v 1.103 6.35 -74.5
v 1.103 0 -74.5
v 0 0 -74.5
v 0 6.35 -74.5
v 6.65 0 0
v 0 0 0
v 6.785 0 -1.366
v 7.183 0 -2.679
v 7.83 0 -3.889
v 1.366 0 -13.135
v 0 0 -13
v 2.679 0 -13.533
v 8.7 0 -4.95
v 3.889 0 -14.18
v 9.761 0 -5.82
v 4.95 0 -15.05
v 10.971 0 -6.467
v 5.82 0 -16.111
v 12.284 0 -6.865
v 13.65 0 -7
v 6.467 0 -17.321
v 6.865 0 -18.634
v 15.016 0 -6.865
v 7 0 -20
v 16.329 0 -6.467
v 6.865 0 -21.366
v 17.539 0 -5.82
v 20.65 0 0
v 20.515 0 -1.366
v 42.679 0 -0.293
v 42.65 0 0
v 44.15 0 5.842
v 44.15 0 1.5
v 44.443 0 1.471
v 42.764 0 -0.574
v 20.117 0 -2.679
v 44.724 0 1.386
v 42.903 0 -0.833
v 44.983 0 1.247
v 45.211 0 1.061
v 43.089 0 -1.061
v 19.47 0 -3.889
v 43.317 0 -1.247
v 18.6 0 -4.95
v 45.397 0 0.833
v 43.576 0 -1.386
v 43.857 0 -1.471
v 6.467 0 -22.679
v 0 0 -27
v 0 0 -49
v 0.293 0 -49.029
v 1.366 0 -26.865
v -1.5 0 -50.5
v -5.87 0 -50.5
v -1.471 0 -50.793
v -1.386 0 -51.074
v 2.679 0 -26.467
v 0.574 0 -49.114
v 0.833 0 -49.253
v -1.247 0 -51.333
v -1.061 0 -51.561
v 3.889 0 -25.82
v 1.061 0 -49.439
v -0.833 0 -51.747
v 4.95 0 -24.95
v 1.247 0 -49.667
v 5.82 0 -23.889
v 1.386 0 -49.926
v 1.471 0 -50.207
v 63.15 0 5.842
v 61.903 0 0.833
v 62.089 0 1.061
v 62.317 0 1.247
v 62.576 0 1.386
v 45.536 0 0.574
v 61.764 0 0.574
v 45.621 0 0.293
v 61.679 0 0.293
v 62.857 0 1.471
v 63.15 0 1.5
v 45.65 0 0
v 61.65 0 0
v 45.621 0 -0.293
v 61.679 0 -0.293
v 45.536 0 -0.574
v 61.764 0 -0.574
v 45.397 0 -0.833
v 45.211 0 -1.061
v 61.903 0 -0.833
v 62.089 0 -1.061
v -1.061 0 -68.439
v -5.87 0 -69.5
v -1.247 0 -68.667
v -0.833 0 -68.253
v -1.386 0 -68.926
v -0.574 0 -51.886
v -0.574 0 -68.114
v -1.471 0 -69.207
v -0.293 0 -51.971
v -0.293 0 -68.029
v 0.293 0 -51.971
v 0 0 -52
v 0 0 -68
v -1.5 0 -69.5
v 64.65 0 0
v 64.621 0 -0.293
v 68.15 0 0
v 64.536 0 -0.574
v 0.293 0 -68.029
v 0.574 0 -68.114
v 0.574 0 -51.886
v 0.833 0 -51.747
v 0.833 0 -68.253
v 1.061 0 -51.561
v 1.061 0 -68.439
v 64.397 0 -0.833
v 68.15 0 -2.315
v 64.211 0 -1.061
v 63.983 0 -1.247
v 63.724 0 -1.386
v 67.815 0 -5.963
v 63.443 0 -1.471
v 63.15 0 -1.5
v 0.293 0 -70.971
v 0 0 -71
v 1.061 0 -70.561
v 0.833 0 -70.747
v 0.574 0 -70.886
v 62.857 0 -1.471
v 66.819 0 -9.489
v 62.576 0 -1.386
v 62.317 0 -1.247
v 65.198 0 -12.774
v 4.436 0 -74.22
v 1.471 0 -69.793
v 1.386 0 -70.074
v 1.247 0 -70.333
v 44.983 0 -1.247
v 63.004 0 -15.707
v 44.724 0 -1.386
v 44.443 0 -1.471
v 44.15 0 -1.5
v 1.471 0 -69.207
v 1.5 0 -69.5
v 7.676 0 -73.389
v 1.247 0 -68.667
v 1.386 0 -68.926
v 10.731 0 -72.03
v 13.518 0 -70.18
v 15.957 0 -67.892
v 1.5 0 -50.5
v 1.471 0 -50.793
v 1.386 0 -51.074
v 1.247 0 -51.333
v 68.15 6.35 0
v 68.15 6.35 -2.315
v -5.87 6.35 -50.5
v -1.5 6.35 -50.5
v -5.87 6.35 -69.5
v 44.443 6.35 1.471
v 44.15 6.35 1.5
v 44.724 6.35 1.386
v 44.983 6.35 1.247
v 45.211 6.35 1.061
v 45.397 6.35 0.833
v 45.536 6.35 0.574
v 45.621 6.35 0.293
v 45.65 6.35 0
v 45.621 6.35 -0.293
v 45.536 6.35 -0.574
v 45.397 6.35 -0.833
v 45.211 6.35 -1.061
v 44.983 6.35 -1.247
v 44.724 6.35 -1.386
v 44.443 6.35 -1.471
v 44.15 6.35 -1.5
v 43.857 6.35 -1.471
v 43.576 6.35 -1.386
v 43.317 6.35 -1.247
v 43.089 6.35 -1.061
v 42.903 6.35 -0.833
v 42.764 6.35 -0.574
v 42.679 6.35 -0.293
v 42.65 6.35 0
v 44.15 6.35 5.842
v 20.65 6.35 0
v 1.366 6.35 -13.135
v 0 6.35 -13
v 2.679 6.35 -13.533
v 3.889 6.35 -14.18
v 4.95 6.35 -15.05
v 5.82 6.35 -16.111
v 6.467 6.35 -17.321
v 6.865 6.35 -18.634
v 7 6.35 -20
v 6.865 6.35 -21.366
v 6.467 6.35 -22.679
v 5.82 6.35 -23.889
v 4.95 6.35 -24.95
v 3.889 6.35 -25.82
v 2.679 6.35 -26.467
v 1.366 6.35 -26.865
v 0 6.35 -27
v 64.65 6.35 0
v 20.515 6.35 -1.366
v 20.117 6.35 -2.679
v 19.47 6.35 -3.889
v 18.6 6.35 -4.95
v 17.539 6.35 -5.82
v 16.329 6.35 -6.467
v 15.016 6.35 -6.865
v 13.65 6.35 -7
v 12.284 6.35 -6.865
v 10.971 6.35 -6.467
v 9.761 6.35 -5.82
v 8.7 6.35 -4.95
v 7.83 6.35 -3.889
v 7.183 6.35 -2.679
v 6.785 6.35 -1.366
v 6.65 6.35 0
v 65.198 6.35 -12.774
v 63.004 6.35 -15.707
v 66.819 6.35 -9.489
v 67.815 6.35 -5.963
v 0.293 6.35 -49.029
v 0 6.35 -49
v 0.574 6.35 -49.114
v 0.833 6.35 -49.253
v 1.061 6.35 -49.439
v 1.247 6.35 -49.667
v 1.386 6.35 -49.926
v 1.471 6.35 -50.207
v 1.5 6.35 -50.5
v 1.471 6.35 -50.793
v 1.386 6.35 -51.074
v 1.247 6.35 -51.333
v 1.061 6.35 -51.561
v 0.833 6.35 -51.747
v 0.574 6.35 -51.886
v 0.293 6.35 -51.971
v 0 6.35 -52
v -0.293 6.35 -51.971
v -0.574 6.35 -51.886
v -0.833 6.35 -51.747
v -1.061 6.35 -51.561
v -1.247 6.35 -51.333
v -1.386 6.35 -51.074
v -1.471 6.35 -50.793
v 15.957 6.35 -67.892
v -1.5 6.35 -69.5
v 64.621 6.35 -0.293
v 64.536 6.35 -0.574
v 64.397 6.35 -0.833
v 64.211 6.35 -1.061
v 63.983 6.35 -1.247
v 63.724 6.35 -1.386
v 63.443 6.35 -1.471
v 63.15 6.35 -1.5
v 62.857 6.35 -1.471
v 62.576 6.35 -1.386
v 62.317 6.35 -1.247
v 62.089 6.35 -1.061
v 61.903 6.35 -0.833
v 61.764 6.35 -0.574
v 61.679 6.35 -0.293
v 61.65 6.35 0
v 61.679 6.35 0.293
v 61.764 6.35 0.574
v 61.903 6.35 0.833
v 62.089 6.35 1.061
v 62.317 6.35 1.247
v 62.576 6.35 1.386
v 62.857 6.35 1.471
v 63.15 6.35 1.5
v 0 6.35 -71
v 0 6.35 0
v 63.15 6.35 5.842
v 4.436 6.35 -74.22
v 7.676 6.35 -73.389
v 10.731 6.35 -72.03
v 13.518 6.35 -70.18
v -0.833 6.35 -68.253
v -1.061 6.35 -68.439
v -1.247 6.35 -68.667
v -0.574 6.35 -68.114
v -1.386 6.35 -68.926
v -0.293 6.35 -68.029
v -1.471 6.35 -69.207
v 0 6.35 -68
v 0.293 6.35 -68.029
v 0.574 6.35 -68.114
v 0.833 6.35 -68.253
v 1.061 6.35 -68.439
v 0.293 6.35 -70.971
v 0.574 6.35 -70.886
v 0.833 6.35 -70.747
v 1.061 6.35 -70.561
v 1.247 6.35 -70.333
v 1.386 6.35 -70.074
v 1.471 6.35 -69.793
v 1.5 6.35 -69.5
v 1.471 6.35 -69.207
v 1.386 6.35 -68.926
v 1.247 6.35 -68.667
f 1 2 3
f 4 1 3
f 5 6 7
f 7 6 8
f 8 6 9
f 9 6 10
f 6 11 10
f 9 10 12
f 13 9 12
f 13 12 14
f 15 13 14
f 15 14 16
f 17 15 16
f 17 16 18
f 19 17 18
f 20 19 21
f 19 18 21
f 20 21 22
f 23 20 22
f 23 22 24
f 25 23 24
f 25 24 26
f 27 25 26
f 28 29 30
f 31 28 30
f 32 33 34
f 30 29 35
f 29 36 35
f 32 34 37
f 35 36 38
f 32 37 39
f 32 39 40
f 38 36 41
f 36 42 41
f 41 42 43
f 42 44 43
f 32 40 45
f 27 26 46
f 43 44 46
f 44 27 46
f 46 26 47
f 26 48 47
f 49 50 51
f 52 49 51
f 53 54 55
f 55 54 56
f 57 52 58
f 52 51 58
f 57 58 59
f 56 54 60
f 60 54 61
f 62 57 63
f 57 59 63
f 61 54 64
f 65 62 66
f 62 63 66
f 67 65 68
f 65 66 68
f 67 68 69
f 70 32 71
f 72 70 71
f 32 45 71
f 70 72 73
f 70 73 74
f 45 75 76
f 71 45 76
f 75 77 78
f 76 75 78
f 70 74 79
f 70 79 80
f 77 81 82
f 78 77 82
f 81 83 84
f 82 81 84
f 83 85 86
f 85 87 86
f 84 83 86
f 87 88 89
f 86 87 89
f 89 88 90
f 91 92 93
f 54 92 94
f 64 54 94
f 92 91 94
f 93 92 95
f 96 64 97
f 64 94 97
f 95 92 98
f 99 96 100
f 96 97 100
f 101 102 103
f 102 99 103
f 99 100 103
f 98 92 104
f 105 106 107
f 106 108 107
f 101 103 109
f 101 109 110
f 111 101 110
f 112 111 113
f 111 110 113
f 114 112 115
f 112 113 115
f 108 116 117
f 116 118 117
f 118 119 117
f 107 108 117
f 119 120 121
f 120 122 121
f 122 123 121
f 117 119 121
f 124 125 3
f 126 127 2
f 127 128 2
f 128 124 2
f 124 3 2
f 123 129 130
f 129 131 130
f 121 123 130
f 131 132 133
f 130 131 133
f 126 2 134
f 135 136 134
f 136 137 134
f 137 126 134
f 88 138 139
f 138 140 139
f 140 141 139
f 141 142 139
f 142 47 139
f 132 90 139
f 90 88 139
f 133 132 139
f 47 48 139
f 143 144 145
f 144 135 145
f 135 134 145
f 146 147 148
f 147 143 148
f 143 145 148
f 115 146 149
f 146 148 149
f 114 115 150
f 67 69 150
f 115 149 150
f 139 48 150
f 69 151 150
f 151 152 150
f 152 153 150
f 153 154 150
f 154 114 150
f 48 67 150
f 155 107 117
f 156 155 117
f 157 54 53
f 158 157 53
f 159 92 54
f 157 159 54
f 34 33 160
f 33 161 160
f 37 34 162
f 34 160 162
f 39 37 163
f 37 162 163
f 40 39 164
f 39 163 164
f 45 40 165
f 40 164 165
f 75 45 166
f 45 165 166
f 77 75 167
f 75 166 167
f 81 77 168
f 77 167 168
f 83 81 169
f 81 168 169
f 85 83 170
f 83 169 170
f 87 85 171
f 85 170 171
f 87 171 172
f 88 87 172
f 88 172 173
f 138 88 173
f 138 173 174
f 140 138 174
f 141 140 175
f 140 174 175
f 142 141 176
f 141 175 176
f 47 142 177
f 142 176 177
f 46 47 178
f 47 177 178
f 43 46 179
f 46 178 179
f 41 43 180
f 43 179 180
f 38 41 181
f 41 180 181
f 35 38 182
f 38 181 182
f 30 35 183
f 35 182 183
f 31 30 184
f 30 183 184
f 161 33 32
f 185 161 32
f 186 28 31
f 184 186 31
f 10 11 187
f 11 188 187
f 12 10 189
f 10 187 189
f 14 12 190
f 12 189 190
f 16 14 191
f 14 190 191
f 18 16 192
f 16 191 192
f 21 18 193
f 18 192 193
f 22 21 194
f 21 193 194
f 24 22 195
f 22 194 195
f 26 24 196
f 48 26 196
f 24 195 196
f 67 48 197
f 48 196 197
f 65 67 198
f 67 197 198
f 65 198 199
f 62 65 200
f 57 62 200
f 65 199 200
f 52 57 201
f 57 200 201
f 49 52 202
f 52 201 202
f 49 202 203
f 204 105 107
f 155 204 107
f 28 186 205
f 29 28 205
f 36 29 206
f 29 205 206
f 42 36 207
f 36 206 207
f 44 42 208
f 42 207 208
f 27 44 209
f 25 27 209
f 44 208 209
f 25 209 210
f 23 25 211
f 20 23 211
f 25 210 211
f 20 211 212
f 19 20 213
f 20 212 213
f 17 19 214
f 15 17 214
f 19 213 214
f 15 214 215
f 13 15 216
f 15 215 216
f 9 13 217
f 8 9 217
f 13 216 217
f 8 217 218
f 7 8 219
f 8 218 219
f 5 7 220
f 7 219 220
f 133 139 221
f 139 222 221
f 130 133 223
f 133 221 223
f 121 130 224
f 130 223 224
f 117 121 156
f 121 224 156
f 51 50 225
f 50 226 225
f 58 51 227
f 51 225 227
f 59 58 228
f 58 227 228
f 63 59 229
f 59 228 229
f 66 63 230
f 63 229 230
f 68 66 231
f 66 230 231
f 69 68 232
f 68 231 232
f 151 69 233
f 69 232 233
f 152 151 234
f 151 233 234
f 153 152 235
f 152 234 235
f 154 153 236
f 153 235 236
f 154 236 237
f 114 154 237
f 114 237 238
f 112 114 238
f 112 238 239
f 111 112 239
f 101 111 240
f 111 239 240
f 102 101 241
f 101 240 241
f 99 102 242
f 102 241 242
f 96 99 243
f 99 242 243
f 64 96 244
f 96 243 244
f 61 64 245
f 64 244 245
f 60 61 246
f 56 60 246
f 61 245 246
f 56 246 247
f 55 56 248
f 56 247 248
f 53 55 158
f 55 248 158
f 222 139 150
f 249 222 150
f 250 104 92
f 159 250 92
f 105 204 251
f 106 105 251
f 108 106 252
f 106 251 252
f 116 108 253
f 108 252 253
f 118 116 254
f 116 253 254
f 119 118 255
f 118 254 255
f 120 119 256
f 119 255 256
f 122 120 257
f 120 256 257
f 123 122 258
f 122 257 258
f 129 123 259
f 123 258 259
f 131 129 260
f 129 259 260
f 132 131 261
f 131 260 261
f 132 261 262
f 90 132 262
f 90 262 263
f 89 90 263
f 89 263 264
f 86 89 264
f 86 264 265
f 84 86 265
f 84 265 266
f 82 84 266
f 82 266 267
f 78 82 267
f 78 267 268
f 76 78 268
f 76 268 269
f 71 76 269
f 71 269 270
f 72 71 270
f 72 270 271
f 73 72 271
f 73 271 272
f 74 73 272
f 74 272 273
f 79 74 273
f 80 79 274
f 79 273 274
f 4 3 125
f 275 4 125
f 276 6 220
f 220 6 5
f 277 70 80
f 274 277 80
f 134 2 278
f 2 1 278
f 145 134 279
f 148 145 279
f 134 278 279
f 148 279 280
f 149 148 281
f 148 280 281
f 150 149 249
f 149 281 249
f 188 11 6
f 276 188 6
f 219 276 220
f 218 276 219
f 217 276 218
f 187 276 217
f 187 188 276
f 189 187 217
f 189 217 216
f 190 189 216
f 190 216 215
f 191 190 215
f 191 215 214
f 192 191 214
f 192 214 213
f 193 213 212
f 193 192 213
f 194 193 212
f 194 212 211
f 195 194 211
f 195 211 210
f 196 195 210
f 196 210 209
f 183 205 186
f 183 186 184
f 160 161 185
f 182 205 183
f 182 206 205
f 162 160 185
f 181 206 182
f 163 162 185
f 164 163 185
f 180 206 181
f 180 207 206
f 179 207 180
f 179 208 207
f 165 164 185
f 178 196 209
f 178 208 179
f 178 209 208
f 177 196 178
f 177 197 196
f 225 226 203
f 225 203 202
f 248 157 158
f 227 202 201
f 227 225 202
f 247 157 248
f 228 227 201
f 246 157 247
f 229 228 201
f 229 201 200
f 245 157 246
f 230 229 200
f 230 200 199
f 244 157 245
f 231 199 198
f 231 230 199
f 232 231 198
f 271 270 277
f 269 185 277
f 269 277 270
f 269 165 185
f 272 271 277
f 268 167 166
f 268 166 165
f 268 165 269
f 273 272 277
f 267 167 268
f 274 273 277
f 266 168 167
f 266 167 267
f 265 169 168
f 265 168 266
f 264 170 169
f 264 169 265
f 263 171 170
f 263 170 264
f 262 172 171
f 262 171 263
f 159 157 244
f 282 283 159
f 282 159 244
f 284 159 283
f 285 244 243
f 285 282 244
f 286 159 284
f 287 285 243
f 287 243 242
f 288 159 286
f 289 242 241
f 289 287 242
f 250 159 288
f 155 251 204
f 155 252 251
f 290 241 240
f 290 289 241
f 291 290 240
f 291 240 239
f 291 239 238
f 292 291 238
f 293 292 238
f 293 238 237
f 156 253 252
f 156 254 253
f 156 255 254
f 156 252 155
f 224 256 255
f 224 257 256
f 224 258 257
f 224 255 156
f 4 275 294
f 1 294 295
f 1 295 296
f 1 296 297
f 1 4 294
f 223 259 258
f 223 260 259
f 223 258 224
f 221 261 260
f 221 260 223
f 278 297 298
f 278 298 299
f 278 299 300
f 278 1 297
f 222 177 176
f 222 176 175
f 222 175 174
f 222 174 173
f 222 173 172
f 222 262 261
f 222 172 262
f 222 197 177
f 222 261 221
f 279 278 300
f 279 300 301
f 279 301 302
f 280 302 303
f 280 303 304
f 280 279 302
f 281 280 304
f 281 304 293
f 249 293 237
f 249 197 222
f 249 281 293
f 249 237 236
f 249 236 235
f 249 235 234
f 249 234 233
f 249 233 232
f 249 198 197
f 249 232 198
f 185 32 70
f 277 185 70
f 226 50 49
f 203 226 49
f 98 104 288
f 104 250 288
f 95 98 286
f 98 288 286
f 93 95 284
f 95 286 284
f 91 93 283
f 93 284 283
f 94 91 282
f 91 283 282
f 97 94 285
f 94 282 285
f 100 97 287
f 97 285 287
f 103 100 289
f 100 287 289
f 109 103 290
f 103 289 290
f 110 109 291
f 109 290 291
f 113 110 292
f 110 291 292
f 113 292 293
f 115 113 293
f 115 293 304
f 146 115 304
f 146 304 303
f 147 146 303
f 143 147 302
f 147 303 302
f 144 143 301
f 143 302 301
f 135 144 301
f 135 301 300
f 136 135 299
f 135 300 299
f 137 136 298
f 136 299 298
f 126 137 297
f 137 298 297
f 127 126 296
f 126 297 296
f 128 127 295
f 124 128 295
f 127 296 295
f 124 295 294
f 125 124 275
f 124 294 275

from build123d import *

# Parameters (mm, degrees)
BOSS_EXTRUDE1_DEPTH = 6.35
SKETCH3_R           = 1.5
SKETCH3_R_2         = 7
CUT_EXTRUDE1_DEPTH  = 7.35
FILLET1_R           = 20


with BuildPart() as part:
    # Sketch2 → Boss-Extrude1 (new body)
    with BuildSketch(Plane(origin=(0, 0, 0), x_dir=(1, 0, 0), z_dir=(0, 1, 0))):
        Polygon((0, 0), (44.15, 0), (44.15, -5.842), (63.15, -5.842), (63.15, 0), (68.15, 0), (68.15, 10), (10, 74.5), (0, 74.5), (0, 69.5), (-5.87, 69.5), (-5.87, 50.5), (0, 50.5), align=None)
    extrude(amount=BOSS_EXTRUDE1_DEPTH)

    # Sketch3 → Cut-Extrude1 (cut, through all)
    with BuildSketch(Plane(origin=(0, 6.35, 0), x_dir=(1, 0, 0), z_dir=(0, 1, 0))):
        with Locations((0, 69.5)):
            Circle(SKETCH3_R)
        with Locations((0, 50.5)):
            Circle(SKETCH3_R)
        with Locations((44.15, 0)):
            Circle(SKETCH3_R)
        with Locations((63.15, 0)):
            Circle(SKETCH3_R)
        with Locations((0, 20)):
            Circle(SKETCH3_R_2)
        with Locations((13.65, 0)):
            Circle(SKETCH3_R_2)
    extrude(amount=-CUT_EXTRUDE1_DEPTH, mode=Mode.SUBTRACT)

    # Fillet1
    fillet1_edges = [part.edges().sort_by_distance(p)[0] for p in [
        (10, 3.175, -74.5),
        (68.15, 3.175, -10),
    ]]
    fillet(fillet1_edges, radius=FILLET1_R)


solid = part.part
